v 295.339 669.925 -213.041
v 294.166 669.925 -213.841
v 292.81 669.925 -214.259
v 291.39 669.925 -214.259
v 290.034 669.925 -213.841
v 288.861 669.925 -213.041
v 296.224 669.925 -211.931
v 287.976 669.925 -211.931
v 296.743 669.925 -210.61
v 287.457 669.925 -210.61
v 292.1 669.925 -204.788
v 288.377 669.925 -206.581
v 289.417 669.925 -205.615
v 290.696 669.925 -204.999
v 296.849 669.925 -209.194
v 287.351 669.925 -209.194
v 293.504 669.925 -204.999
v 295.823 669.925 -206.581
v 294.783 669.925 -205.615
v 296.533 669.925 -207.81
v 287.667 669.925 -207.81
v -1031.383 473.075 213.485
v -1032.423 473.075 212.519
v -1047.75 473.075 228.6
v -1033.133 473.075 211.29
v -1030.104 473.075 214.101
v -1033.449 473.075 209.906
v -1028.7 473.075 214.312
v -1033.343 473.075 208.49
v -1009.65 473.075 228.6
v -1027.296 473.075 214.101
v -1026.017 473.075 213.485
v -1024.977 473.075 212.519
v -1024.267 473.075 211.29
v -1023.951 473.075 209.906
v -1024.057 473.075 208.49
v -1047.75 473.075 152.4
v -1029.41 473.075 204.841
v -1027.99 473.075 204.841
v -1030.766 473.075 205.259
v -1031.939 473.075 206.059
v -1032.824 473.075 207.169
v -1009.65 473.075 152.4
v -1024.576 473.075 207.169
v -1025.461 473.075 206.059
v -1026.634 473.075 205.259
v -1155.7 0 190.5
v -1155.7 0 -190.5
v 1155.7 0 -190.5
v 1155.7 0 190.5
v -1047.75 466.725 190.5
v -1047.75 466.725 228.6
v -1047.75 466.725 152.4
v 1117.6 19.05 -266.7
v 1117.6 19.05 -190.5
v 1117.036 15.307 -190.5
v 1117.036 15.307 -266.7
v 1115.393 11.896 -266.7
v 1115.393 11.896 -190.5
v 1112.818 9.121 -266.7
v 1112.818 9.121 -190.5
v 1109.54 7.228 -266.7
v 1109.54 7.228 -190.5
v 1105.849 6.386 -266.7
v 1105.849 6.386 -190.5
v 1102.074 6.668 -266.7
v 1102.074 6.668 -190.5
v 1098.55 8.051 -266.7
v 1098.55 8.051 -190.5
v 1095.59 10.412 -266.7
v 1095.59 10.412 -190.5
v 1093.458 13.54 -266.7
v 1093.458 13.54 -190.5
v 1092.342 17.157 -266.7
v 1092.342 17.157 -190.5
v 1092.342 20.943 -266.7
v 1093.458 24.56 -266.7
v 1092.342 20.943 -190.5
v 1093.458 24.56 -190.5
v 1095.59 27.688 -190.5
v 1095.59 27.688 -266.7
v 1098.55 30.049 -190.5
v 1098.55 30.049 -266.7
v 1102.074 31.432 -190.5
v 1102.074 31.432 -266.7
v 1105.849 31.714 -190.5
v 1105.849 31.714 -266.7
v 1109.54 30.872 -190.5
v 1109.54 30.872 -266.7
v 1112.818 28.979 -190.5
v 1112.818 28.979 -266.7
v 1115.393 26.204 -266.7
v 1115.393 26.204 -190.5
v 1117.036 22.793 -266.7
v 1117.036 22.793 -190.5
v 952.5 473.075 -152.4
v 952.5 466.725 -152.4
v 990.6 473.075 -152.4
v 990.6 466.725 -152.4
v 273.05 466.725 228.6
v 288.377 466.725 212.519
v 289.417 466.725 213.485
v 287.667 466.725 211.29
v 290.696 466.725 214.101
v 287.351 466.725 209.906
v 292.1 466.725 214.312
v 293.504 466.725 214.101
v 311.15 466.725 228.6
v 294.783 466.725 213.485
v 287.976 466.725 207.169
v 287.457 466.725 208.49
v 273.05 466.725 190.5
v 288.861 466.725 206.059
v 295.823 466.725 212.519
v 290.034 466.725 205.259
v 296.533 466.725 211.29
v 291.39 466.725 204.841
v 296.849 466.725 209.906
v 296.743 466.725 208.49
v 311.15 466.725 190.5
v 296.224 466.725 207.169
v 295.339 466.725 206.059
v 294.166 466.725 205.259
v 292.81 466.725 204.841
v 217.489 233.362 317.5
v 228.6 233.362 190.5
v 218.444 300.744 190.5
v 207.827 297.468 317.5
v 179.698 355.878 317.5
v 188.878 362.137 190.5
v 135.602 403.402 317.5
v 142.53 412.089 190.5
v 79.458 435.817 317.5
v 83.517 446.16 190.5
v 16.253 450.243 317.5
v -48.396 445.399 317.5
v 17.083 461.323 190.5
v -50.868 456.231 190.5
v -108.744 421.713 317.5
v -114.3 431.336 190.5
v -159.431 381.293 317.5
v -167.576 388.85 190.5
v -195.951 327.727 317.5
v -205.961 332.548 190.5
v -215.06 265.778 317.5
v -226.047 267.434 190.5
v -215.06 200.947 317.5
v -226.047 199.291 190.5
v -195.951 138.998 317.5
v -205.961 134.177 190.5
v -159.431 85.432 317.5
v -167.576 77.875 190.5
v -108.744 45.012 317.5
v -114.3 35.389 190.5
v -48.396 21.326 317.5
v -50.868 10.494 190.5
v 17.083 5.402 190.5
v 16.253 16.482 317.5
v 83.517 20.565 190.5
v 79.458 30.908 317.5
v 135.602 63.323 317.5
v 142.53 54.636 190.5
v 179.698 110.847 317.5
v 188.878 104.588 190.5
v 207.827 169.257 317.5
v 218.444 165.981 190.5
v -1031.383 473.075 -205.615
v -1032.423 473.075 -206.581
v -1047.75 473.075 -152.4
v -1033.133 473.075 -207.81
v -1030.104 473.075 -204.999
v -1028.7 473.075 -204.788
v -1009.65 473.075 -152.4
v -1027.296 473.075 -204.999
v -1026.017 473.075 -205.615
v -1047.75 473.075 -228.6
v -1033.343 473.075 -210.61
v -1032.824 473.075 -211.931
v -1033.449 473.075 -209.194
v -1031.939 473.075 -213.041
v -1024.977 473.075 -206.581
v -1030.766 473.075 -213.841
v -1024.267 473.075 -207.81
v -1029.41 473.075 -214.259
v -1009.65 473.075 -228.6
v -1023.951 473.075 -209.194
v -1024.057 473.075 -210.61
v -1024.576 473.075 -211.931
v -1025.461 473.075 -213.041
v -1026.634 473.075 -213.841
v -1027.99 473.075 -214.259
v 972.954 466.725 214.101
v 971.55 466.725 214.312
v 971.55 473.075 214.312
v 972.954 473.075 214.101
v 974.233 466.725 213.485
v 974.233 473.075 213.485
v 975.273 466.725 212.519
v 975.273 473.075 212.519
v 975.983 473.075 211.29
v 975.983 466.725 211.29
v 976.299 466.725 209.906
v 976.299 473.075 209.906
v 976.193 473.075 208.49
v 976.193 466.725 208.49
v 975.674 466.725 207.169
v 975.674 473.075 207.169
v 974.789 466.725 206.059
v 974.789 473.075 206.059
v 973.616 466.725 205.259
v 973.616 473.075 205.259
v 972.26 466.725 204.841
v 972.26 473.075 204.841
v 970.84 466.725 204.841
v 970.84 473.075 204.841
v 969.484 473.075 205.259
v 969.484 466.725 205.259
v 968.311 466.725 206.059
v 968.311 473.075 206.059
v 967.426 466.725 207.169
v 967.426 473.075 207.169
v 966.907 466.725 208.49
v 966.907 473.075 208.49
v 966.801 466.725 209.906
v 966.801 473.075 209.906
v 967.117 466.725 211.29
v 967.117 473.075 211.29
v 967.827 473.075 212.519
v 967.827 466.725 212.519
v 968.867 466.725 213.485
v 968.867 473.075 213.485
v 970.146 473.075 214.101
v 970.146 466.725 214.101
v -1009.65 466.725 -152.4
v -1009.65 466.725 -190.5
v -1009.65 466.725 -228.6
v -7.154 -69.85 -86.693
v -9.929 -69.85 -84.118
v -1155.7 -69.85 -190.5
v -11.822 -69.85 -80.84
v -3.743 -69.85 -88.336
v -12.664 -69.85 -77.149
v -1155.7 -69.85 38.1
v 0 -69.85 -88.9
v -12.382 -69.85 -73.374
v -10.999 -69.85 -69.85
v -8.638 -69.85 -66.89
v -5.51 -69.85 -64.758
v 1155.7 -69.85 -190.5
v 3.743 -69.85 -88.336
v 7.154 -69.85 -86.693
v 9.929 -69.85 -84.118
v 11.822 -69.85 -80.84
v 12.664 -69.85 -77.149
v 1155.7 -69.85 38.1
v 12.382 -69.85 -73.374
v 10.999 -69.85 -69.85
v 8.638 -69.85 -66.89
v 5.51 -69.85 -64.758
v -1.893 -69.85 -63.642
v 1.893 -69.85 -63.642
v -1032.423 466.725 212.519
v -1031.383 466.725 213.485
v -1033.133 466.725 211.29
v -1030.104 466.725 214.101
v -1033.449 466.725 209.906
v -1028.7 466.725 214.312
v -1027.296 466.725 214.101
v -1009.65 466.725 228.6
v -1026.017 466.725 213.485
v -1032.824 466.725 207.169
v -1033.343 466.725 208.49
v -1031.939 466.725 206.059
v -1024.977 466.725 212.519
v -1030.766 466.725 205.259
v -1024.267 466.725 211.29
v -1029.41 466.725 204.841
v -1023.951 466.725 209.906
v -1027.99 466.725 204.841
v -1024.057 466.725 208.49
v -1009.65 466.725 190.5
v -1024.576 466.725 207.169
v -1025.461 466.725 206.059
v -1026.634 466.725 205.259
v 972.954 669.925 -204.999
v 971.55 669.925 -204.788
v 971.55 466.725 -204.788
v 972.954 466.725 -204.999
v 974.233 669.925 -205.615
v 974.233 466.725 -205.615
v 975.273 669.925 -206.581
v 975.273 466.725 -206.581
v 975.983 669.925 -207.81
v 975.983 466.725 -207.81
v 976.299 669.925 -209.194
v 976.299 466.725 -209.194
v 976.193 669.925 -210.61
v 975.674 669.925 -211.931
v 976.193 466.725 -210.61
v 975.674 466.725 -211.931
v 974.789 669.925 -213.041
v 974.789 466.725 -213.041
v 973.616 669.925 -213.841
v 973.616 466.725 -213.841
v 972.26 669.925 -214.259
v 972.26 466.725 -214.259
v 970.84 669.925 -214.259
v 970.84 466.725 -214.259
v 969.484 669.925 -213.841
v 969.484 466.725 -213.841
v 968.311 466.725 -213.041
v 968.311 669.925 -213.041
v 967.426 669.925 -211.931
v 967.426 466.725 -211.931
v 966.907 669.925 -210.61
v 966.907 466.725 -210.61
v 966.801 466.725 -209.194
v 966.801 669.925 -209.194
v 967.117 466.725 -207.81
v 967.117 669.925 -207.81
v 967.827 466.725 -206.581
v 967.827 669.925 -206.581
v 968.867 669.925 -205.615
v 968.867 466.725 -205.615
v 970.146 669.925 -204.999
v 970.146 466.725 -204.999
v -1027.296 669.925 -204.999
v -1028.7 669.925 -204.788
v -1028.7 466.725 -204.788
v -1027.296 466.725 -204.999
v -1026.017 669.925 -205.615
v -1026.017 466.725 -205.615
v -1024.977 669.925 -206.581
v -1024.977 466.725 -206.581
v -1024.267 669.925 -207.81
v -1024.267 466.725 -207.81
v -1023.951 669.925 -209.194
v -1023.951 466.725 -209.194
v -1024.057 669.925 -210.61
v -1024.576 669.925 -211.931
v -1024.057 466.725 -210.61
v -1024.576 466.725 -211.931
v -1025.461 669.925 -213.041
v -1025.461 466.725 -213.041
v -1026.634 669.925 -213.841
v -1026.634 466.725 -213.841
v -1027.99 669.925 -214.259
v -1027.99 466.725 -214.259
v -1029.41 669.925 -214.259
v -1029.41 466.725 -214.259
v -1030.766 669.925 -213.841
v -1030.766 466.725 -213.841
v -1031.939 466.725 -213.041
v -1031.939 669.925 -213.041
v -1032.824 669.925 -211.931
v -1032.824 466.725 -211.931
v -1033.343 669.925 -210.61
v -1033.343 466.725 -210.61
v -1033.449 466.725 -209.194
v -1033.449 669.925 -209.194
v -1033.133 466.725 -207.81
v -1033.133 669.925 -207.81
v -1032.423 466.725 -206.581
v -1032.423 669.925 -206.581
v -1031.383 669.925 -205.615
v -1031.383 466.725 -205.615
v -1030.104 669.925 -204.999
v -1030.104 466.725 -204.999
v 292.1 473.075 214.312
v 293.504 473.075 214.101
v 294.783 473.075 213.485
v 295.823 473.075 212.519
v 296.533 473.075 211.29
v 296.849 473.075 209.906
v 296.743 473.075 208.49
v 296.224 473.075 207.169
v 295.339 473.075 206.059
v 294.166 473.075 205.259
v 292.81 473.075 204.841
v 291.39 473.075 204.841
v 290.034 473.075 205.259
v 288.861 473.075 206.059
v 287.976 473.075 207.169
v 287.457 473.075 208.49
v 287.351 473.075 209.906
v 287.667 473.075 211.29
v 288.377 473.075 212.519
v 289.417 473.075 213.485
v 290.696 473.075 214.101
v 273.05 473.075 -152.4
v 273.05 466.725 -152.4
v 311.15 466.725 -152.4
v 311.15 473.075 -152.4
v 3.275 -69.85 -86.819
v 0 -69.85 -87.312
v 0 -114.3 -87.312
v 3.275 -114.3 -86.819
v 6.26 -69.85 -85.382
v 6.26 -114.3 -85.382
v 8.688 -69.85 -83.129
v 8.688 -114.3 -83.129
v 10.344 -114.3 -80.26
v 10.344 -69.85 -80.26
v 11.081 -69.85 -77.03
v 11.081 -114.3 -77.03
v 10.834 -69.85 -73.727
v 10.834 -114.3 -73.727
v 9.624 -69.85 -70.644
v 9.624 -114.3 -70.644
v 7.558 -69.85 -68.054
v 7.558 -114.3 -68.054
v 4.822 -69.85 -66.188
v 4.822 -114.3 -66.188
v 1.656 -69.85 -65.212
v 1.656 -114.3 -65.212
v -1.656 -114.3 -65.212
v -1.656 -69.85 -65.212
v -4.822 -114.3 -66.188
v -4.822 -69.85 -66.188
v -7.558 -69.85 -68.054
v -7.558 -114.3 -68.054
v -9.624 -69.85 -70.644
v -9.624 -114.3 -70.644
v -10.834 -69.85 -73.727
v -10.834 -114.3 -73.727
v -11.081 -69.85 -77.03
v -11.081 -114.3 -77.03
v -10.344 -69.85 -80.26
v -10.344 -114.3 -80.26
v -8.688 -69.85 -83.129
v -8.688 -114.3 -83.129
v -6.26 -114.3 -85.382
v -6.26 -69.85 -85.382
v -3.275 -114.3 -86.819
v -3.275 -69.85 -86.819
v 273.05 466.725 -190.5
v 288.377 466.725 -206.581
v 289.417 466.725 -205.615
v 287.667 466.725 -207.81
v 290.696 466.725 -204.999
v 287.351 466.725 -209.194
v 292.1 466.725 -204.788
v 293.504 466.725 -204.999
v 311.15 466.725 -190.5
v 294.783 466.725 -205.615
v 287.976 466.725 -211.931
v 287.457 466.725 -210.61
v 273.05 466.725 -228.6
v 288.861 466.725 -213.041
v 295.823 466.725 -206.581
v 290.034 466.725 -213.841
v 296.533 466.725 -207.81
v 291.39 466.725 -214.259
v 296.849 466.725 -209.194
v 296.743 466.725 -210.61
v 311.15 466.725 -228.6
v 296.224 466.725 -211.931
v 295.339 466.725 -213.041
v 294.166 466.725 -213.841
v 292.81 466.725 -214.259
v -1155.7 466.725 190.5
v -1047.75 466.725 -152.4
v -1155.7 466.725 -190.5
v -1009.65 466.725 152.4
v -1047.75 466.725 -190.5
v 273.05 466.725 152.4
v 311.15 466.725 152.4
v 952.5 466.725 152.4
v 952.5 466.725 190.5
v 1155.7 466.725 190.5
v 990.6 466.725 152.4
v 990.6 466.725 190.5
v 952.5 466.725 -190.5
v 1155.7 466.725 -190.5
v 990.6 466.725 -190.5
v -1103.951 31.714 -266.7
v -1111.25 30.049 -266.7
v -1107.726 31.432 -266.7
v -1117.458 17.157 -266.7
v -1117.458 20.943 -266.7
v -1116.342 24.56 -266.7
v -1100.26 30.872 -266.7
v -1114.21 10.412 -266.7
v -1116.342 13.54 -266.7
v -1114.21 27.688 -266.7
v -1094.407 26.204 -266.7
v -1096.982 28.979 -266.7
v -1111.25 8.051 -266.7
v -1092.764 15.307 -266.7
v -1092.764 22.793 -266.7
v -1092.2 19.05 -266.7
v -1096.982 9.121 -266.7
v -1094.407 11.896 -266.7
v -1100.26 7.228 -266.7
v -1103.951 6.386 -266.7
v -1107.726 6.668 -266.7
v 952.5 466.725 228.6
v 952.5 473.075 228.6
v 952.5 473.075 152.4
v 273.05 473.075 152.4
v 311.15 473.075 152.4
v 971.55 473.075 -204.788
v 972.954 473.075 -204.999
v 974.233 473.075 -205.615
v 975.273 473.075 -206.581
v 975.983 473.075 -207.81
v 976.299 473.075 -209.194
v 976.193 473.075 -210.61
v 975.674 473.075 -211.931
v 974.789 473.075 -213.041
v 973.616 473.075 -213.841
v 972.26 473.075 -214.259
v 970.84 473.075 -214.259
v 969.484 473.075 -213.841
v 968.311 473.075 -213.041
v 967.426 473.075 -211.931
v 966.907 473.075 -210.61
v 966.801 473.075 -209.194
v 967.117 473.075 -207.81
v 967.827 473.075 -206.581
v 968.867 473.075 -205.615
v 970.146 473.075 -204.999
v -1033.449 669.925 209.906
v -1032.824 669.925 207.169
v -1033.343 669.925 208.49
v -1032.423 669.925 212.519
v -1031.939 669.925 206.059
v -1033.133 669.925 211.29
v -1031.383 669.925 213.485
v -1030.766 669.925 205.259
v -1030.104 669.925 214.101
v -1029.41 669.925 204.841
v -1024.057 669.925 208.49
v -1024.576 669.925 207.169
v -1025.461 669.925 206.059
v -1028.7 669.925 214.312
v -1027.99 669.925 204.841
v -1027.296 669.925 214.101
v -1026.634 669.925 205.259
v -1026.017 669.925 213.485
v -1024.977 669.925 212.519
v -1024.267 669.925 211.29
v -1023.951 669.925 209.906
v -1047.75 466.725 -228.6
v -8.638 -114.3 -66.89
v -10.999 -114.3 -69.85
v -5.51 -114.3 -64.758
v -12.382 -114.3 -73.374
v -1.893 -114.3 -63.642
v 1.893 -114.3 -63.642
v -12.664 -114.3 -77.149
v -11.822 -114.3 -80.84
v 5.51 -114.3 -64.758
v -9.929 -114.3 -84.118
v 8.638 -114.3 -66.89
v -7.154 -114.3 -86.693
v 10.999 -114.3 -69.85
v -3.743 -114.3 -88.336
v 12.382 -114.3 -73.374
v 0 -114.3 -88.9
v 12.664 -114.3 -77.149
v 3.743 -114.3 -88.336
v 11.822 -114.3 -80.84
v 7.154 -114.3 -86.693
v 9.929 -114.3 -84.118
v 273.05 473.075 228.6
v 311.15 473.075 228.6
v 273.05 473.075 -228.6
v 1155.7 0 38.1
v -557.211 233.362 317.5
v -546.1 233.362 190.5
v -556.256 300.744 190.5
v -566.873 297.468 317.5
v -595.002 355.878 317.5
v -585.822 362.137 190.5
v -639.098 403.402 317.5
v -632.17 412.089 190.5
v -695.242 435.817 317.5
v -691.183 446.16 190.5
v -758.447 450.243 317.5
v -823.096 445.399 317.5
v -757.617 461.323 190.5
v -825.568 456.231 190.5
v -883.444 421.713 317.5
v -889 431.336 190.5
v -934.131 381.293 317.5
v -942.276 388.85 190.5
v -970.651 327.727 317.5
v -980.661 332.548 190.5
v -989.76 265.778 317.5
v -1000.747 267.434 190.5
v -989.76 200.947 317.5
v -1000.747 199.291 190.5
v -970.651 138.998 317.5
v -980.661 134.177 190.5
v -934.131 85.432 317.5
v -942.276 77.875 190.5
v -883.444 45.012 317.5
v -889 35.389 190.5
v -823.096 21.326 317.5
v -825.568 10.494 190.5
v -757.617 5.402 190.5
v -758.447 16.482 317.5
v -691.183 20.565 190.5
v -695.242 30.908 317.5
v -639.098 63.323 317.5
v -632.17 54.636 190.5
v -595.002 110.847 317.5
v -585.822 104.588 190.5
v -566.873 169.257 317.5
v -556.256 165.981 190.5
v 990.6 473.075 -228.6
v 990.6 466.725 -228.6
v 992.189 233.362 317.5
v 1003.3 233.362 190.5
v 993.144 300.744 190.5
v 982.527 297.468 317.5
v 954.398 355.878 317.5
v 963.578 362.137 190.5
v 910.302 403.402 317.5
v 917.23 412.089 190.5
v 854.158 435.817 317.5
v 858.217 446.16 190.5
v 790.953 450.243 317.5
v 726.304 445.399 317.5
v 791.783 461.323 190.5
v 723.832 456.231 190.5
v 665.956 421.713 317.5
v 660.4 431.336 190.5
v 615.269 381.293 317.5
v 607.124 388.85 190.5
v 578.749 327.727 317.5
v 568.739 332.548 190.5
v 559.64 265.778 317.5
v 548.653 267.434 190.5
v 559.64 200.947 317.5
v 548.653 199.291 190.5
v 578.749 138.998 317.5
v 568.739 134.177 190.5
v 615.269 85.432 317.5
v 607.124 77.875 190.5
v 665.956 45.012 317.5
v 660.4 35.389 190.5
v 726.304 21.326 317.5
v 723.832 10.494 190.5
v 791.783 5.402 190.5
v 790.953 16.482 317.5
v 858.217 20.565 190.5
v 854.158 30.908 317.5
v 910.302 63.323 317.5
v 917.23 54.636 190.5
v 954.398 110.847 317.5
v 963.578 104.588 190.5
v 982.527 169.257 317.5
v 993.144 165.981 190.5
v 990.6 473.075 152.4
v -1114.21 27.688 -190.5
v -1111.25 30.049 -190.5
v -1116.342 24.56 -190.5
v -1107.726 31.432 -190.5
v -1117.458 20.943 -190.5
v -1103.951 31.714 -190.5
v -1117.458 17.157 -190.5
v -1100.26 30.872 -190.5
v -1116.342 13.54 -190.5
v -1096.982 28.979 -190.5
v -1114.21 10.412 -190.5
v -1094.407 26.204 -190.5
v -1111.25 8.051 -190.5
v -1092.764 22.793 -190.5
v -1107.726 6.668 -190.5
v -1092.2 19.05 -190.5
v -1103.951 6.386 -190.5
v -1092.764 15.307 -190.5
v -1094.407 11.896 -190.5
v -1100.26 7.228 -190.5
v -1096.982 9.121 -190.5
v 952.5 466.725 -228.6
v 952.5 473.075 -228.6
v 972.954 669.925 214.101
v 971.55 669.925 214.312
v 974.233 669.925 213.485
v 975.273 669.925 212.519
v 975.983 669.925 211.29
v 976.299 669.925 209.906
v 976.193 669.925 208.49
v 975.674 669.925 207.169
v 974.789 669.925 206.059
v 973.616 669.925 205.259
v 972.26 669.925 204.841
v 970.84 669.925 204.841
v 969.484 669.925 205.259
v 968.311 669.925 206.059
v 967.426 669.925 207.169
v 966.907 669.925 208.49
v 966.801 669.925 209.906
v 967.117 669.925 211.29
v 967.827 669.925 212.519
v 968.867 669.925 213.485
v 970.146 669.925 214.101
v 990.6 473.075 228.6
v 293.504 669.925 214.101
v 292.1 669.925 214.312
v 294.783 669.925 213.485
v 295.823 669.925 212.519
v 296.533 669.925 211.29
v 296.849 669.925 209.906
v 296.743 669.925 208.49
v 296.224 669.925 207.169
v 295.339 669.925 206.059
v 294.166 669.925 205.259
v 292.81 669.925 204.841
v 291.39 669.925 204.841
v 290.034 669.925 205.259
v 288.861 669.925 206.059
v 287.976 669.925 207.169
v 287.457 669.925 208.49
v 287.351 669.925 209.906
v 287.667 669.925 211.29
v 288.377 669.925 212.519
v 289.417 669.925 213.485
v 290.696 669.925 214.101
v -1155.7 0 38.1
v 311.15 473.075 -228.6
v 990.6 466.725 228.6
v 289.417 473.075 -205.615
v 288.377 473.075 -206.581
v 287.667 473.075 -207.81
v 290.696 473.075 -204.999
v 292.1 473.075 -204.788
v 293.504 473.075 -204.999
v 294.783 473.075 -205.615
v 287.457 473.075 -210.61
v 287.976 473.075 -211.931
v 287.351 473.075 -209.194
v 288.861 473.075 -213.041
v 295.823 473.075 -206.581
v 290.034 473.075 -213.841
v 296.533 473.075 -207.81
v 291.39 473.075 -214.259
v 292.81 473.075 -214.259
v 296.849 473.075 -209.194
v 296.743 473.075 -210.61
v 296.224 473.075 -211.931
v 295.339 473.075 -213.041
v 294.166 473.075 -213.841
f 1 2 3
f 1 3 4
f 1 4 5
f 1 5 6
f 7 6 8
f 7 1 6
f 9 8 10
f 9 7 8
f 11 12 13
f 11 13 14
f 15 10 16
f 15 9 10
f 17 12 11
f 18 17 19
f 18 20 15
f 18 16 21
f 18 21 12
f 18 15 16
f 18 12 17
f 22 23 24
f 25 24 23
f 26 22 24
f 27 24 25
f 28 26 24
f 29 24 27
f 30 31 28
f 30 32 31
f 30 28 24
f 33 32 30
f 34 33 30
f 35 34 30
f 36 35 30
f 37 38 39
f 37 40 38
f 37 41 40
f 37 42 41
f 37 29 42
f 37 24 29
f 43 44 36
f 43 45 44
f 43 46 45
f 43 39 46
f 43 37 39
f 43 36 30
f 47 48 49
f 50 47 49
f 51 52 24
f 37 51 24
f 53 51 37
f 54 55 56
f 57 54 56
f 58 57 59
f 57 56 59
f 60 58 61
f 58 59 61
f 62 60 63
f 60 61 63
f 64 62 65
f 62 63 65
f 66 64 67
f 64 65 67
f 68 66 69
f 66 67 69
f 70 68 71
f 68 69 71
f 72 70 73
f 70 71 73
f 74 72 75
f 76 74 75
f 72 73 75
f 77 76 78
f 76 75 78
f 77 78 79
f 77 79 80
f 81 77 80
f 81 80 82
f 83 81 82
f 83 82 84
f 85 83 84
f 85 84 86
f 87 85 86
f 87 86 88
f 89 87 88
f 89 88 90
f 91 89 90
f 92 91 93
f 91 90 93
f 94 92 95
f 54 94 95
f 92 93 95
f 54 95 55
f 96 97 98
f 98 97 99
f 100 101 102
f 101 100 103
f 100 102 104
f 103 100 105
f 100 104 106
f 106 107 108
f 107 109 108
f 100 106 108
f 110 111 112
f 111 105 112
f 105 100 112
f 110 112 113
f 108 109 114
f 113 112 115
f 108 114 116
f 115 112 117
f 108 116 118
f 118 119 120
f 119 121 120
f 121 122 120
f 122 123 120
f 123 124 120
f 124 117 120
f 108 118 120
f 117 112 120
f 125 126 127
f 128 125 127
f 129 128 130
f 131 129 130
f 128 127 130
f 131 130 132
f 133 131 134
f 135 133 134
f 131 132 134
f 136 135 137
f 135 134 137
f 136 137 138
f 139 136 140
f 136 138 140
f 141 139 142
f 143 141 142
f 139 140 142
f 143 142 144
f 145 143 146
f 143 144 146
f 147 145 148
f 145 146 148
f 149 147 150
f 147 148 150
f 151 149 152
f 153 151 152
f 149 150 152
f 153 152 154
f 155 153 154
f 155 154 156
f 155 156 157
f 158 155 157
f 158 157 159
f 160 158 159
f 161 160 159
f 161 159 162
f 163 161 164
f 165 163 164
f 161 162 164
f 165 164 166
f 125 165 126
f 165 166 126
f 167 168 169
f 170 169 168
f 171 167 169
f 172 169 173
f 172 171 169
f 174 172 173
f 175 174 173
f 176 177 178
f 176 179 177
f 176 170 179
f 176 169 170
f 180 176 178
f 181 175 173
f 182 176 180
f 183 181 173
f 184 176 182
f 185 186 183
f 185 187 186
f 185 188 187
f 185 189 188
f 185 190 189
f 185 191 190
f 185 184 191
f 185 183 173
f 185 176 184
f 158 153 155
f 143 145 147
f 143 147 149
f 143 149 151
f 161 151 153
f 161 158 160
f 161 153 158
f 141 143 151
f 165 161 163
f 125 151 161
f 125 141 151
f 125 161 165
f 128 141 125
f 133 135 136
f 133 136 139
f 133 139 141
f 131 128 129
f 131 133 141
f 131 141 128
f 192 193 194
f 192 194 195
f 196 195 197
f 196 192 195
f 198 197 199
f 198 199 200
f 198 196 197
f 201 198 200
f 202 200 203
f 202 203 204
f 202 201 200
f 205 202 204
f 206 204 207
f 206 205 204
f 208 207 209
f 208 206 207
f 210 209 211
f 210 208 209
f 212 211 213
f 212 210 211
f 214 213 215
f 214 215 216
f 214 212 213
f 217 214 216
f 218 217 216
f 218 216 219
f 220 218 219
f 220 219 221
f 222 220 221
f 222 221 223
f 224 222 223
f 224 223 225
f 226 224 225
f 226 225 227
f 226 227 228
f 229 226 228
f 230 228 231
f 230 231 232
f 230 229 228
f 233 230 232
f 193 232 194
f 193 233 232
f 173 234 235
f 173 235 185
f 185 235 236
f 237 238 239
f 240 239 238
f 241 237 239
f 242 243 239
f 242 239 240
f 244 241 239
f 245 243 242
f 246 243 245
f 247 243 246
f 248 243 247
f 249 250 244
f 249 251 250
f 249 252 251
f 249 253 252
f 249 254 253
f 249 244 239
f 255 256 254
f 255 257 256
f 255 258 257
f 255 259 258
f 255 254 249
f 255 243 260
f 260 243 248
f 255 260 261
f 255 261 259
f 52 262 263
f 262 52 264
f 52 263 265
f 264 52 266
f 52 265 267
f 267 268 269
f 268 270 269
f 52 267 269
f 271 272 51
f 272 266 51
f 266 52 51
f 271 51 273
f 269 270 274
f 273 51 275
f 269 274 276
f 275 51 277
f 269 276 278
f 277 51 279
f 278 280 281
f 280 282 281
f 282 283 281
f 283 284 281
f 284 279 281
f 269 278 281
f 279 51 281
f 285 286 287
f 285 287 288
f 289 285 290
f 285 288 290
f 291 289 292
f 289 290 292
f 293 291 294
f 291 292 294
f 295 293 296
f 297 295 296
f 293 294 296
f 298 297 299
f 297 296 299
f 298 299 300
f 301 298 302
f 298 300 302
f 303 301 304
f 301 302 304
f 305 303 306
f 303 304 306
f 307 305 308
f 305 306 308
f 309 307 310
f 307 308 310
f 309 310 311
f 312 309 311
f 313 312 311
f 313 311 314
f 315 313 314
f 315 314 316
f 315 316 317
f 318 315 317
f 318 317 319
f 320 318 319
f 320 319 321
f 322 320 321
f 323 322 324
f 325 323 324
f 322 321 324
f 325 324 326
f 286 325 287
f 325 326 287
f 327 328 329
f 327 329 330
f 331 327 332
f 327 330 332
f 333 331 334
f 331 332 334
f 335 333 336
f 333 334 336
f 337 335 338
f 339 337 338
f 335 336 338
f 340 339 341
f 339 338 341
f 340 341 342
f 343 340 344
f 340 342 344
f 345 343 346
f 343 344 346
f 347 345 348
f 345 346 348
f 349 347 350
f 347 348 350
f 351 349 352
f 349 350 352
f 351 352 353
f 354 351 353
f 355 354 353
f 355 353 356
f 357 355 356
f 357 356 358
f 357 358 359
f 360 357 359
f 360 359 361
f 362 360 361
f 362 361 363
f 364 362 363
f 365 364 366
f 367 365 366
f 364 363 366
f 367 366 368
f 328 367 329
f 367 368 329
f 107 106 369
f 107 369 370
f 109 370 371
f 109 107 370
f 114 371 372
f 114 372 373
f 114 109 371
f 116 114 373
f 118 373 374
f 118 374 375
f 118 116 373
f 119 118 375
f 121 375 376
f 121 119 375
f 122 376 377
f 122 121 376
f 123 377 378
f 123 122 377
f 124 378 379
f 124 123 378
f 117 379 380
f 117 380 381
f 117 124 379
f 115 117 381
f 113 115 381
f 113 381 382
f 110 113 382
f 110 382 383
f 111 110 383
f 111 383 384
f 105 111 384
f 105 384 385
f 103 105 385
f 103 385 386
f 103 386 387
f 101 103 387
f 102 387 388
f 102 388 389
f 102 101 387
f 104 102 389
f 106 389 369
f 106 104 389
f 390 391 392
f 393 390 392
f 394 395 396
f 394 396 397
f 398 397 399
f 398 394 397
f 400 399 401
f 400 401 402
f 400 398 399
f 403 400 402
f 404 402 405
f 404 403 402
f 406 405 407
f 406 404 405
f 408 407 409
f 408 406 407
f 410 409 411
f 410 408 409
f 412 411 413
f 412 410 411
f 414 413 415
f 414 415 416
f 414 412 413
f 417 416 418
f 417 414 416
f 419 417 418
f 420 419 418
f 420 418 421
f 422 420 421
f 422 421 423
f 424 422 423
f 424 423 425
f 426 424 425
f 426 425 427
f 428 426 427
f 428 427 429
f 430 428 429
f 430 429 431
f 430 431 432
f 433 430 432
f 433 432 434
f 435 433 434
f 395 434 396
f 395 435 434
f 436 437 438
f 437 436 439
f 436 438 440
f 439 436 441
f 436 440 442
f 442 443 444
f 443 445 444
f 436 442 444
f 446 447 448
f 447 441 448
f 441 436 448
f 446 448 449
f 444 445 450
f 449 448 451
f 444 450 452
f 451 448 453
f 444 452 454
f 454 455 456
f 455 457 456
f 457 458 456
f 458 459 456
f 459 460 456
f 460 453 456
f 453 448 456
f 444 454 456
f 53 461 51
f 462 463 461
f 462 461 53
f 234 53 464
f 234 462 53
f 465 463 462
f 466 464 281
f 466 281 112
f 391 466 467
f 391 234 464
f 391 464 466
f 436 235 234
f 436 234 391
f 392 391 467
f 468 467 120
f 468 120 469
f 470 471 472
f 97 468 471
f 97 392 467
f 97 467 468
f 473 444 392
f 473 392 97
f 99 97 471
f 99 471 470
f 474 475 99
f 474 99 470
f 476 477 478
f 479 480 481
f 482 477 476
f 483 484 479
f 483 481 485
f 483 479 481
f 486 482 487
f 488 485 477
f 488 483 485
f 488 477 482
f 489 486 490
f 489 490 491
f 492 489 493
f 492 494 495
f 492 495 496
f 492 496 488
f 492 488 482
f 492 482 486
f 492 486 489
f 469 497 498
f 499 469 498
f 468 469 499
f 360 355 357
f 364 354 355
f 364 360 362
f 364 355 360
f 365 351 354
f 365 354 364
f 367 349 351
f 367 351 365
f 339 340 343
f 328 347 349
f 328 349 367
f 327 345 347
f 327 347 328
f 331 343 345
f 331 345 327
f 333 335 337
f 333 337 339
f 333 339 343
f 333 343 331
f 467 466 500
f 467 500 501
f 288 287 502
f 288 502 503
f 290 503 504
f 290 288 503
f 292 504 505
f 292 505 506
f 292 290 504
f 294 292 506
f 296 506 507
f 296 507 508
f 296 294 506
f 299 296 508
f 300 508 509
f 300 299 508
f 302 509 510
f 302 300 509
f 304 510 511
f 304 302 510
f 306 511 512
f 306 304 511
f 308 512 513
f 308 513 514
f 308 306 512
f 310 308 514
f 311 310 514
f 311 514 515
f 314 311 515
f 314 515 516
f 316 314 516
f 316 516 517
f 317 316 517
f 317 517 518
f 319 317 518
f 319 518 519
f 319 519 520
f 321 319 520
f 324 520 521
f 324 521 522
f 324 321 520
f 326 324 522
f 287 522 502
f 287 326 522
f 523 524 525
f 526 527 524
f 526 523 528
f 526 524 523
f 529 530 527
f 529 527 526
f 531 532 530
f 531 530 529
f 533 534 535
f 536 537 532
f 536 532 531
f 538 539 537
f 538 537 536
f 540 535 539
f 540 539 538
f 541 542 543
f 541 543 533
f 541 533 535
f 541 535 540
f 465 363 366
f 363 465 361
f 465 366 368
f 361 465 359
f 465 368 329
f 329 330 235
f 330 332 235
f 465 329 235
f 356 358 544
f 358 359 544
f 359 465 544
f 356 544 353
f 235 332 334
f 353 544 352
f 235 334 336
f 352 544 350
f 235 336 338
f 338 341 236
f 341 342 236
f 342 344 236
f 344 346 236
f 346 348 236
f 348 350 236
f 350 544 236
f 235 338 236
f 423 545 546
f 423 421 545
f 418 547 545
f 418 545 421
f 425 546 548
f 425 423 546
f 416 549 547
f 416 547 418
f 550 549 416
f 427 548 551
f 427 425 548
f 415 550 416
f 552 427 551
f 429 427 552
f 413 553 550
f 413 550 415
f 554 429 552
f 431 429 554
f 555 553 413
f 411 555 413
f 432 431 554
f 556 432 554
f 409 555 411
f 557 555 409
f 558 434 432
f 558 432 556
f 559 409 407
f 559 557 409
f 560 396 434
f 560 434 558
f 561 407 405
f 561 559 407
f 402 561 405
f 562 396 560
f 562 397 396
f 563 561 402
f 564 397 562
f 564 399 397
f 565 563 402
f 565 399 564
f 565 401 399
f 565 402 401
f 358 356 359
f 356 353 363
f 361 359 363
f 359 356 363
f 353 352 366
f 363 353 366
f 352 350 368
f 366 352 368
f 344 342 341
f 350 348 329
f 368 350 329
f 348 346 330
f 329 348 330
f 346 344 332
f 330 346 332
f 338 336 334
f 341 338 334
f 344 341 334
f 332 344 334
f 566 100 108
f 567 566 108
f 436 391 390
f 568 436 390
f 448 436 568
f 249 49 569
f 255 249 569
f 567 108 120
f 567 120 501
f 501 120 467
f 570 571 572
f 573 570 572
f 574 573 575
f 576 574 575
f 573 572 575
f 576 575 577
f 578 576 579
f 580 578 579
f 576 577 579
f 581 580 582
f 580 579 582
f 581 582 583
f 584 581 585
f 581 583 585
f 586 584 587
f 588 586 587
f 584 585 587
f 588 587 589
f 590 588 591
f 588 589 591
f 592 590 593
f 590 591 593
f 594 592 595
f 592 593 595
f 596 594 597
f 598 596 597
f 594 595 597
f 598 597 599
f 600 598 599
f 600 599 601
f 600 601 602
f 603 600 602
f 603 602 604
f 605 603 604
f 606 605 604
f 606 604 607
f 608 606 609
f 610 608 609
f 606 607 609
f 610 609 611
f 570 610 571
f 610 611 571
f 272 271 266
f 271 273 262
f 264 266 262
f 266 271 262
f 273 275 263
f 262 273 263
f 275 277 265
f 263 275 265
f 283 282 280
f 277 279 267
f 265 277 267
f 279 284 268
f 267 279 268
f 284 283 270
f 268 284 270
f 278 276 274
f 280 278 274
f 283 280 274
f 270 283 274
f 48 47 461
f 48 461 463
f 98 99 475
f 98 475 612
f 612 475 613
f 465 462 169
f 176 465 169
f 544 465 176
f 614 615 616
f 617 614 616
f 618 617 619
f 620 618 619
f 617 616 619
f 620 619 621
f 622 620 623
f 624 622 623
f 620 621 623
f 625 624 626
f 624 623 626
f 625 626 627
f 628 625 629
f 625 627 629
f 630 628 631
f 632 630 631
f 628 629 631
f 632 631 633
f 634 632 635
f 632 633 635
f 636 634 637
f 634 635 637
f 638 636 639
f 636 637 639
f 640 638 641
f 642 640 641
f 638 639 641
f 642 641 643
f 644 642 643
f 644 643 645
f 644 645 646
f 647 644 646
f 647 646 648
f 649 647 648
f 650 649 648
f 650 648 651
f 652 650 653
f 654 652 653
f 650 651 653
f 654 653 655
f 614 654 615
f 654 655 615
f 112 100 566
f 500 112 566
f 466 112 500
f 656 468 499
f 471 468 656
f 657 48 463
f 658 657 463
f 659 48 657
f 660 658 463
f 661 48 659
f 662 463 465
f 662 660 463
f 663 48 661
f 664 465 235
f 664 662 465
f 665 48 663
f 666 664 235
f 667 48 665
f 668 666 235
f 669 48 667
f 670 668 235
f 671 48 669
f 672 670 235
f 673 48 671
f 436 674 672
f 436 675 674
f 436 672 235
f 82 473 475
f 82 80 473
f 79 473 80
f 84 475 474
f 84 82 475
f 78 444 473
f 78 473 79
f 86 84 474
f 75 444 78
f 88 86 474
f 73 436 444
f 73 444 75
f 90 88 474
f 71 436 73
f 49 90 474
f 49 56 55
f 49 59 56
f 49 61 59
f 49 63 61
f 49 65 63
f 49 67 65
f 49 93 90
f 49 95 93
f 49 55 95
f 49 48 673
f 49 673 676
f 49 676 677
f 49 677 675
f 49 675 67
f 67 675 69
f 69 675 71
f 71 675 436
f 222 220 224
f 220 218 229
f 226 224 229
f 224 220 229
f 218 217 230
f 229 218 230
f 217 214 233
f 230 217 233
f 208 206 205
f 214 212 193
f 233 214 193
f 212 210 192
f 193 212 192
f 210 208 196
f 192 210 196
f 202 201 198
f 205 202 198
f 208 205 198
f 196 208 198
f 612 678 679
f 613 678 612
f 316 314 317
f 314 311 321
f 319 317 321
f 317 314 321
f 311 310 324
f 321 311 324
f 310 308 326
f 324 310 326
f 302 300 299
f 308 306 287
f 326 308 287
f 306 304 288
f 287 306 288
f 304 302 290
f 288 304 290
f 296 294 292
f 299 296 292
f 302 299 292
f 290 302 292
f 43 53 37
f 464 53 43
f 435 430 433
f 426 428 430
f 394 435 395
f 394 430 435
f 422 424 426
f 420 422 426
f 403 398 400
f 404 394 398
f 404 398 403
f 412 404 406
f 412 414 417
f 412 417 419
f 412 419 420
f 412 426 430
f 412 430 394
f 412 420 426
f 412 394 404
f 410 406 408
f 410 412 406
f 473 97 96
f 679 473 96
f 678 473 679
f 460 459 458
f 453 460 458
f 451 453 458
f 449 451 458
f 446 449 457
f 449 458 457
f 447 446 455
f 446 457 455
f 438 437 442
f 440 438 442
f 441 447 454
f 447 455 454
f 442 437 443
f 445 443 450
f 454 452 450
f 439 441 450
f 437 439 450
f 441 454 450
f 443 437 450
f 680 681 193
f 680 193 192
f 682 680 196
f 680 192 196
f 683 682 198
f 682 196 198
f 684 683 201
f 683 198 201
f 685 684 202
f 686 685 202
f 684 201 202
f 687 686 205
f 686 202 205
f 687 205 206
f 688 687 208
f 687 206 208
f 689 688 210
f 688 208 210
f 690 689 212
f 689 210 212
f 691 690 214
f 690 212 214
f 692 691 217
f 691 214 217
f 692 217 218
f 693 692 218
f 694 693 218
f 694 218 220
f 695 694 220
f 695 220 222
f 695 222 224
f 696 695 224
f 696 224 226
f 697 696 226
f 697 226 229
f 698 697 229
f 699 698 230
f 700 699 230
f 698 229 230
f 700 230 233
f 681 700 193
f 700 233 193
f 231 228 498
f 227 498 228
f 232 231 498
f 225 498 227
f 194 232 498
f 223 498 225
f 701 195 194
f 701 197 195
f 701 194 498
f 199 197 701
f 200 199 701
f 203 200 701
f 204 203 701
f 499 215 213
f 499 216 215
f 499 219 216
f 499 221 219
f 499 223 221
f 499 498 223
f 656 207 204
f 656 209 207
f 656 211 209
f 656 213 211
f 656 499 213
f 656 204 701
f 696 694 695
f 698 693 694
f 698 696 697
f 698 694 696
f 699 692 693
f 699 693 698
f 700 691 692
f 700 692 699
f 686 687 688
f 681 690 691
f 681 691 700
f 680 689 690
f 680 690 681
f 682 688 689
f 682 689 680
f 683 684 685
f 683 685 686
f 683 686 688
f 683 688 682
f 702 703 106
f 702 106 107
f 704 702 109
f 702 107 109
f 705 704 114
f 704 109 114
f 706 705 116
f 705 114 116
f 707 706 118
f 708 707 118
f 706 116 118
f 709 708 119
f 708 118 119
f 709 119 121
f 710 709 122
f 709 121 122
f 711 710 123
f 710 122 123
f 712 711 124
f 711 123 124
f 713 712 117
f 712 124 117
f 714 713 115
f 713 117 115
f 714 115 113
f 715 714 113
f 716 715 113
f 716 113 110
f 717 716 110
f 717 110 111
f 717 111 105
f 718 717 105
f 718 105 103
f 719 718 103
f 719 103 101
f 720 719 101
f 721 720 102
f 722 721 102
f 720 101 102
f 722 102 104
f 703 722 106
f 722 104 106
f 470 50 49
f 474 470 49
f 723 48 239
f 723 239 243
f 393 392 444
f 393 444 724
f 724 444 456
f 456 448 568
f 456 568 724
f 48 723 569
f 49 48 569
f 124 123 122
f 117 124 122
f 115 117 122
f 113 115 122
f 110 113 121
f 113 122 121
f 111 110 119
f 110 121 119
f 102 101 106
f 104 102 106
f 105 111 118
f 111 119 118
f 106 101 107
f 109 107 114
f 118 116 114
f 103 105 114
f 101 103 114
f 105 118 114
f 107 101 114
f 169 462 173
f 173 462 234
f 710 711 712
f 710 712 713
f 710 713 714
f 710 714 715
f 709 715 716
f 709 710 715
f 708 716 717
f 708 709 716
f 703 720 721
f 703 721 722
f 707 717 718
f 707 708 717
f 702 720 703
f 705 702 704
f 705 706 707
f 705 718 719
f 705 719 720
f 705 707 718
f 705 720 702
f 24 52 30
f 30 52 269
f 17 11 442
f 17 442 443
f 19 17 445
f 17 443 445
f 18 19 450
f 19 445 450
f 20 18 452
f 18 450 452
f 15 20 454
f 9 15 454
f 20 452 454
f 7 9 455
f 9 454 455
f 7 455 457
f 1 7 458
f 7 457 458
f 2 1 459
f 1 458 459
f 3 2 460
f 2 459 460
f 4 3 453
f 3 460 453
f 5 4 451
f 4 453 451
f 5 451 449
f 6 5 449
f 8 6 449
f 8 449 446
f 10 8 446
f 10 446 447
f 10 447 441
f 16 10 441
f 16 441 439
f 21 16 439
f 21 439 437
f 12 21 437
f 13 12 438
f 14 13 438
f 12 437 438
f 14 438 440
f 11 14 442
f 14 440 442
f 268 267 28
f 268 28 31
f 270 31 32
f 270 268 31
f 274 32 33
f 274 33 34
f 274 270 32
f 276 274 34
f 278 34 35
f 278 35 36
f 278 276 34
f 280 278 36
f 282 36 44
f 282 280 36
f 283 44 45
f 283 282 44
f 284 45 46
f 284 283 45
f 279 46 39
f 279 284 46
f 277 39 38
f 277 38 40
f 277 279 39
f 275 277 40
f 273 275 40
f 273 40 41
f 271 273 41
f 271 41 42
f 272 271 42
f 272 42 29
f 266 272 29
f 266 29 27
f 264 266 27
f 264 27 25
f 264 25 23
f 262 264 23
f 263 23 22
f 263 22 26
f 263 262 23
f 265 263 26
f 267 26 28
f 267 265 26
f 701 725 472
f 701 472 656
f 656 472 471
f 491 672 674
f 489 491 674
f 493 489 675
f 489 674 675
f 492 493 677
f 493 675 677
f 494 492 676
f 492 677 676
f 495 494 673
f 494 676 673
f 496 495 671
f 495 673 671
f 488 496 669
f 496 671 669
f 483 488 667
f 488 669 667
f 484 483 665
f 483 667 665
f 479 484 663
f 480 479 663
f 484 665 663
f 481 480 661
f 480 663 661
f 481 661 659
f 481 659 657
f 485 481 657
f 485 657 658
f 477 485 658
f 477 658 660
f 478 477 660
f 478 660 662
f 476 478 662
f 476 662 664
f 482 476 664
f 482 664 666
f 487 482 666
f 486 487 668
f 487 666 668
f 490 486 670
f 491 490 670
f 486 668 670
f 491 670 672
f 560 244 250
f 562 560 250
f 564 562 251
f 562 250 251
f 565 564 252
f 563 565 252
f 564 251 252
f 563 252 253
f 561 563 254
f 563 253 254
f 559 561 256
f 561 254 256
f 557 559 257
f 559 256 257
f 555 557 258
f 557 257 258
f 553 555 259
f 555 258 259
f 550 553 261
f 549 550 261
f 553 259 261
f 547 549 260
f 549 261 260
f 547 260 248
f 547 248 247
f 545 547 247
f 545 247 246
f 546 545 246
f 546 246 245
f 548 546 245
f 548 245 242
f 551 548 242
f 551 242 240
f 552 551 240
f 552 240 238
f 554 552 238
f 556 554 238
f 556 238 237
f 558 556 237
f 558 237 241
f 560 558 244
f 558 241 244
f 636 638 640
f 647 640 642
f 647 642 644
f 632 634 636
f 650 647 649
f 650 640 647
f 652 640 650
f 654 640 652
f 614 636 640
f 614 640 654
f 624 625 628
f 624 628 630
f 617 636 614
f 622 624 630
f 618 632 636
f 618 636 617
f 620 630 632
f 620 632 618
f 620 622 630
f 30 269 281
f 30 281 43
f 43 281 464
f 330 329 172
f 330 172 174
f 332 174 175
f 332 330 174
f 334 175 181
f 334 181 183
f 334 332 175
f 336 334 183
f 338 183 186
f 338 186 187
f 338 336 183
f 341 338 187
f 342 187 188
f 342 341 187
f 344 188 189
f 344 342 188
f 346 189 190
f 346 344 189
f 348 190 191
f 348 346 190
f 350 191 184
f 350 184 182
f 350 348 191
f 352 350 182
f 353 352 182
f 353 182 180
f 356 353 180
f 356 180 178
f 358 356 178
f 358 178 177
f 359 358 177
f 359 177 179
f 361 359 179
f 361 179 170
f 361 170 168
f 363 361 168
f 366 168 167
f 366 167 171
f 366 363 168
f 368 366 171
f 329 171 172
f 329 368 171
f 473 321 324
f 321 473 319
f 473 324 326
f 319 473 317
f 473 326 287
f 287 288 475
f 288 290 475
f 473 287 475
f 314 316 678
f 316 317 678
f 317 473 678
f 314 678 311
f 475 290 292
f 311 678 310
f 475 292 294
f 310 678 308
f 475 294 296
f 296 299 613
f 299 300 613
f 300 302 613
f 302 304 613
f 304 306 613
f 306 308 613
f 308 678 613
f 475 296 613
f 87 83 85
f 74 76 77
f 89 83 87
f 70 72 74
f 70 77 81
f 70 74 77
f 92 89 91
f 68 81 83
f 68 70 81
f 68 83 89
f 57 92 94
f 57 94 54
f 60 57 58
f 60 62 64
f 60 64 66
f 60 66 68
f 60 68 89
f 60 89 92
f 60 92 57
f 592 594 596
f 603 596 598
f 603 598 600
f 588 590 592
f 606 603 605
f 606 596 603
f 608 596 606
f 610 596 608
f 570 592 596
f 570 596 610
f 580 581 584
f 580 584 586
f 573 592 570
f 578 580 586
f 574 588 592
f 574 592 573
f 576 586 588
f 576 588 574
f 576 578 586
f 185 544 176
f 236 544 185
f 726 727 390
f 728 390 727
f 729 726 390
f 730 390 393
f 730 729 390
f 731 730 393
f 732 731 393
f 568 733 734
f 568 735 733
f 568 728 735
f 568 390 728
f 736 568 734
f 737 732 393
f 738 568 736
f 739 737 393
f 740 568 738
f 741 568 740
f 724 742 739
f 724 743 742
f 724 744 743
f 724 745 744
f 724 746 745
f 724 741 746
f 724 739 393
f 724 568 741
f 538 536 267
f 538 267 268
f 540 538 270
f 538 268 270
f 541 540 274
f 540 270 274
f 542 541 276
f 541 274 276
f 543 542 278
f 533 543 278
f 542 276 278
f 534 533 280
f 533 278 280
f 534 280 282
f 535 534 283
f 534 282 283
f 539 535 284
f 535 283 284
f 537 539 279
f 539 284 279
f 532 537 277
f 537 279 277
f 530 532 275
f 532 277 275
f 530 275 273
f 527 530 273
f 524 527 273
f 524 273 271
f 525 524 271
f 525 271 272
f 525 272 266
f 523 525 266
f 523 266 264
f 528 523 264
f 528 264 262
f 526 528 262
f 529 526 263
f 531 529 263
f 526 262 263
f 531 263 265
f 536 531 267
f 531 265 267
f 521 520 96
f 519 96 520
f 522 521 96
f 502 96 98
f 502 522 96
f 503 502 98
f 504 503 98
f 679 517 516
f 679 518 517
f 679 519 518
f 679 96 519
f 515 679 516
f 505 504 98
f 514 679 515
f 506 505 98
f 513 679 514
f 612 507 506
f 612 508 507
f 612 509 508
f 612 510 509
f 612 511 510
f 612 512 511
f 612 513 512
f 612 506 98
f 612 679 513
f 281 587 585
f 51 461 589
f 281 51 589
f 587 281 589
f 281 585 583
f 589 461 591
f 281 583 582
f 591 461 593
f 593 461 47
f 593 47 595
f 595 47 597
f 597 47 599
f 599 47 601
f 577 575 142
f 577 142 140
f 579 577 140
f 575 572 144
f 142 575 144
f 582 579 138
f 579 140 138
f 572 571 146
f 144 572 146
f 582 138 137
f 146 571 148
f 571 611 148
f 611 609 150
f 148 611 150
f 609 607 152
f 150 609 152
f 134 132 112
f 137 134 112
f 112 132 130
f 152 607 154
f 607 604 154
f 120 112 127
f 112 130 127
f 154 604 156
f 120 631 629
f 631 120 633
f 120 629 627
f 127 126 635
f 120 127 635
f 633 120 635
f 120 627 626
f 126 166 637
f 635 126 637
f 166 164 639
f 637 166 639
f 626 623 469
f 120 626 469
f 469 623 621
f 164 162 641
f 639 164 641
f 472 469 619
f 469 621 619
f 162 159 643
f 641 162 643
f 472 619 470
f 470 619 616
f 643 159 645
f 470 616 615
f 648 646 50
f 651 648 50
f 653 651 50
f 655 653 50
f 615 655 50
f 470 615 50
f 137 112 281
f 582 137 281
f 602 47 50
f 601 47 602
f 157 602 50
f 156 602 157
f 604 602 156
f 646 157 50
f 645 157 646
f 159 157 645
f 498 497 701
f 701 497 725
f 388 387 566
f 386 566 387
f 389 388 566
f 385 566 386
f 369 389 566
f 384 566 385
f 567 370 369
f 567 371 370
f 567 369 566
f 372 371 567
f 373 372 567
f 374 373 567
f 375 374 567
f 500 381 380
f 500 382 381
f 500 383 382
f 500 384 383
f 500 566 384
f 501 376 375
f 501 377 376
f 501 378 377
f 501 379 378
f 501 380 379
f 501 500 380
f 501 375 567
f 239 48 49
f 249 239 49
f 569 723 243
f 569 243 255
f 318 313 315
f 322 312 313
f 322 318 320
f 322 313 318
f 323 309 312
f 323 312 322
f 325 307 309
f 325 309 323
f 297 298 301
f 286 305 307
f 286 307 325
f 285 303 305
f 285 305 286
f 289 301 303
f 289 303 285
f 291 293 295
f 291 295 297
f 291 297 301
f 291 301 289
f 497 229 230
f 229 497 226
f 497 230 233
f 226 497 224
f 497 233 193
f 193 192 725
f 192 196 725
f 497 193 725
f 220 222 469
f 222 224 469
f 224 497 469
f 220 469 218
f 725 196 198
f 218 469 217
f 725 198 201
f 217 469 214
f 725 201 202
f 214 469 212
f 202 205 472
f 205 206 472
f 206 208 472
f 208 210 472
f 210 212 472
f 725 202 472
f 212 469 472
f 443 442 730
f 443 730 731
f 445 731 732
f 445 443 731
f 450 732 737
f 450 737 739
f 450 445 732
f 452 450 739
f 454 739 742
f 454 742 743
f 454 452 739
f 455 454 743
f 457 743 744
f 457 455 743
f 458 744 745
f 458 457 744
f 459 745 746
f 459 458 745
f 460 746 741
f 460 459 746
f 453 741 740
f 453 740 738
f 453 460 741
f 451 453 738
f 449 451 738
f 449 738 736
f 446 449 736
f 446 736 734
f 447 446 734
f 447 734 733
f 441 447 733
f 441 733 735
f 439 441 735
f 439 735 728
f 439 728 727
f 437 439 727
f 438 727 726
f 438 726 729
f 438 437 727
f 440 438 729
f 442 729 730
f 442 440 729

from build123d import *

# Parameters (mm, degrees)
SKETCH1_W                     = 2311.4
SKETCH1_H                     = 381
BOSS_EXTRUDE1_DEPTH           = 466.725
SKETCH2_R                     = 228.6
BOSS_EXTRUDE2_DEPTH           = 127
BOSS_EXTRUDE2_DRAFT           = 5
BOSS_EXTRUDE2_PROFILE_2_DEPTH = 127
BOSS_EXTRUDE2_PROFILE_2_DRAFT = 5
BOSS_EXTRUDE2_PROFILE_3_DEPTH = 127
BOSS_EXTRUDE2_PROFILE_3_DRAFT = 5
SKETCH3_W                     = 38.1
SKETCH3_H                     = 76.2
SKETCH3_R                     = 4.7625
BOSS_EXTRUDE3_DEPTH           = 6.35
SKETCH4_R                     = 4.7625
BOSS_EXTRUDE4_DEPTH           = 203.2
BOSS_EXTRUDE4_2_DEPTH         = 203.2
BOSS_EXTRUDE4_3_DEPTH         = 203.2
BOSS_EXTRUDE4_4_DEPTH         = 203.2
BOSS_EXTRUDE4_5_DEPTH         = 203.2
BOSS_EXTRUDE4_6_DEPTH         = 203.2
SKETCH5_W                     = 2311.4
SKETCH5_H                     = 228.6
BOSS_EXTRUDE5_DEPTH           = 69.85
SKETCH6_R                     = 12.7
SKETCH6_R_2                   = 11.1125
BOSS_EXTRUDE6_DEPTH           = 44.45
SKETCH7_R                     = 12.7
BOSS_EXTRUDE7_DEPTH           = 76.2


with BuildPart() as part:
    # Sketch1 → Boss-Extrude1 (new body)
    with BuildSketch(Plane(origin=(0, 0, 0), x_dir=(1, 0, 0), z_dir=(0, 1, 0))):
        Rectangle(SKETCH1_W, SKETCH1_H)
    extrude(amount=BOSS_EXTRUDE1_DEPTH)


with BuildPart() as boss_extrude2_tool:
    # Sketch2 → Boss-Extrude2 (with draft: the straight prism first)
    with BuildSketch(Plane.XY.offset(190.5)):
        with Locations((0, 233.3625)):
            Circle(SKETCH2_R)
    extrude(amount=BOSS_EXTRUDE2_DEPTH)
    # Boss-Extrude2: the draft: its side faces are tilted about the plane it starts from
    boss_extrude2_sides = [boss_extrude2_tool.faces().sort_by_distance(p)[0] for p in [
        (-228.6, 233.3625, 254),
    ]]
    draft(boss_extrude2_sides, Plane.XY.offset(190.5), BOSS_EXTRUDE2_DRAFT)


with BuildPart() as part_1:
    add(part.part)

    # Boss-Extrude2: add boss_extrude2_tool
    add(boss_extrude2_tool.part)


with BuildPart() as boss_extrude2_profile_2_tool:
    # Sketch2 → Boss-Extrude2 profile 2 (with draft: the straight prism first)
    with BuildSketch(Plane.XY.offset(190.5)):
        with Locations((774.7, 233.3625)):
            Circle(SKETCH2_R)
    extrude(amount=BOSS_EXTRUDE2_PROFILE_2_DEPTH)
    # Boss-Extrude2 profile 2: the draft: its side faces are tilted about the plane it starts from
    boss_extrude2_profile_2_sides = [boss_extrude2_profile_2_tool.faces().sort_by_distance(p)[0] for p in [
        (546.1, 233.3625, 254),
    ]]
    draft(boss_extrude2_profile_2_sides, Plane.XY.offset(190.5), BOSS_EXTRUDE2_PROFILE_2_DRAFT)


with BuildPart() as part_2:
    add(part_1.part)

    # Boss-Extrude2 profile 2: add boss_extrude2_profile_2_tool
    add(boss_extrude2_profile_2_tool.part)


with BuildPart() as boss_extrude2_profile_3_tool:
    # Sketch2 → Boss-Extrude2 profile 3 (with draft: the straight prism first)
    with BuildSketch(Plane.XY.offset(190.5)):
        with Locations((-774.7, 233.3625)):
            Circle(SKETCH2_R)
    extrude(amount=BOSS_EXTRUDE2_PROFILE_3_DEPTH)
    # Boss-Extrude2 profile 3: the draft: its side faces are tilted about the plane it starts from
    boss_extrude2_profile_3_sides = [boss_extrude2_profile_3_tool.faces().sort_by_distance(p)[0] for p in [
        (-1003.3, 233.3625, 254),
    ]]
    draft(boss_extrude2_profile_3_sides, Plane.XY.offset(190.5), BOSS_EXTRUDE2_PROFILE_3_DRAFT)


with BuildPart() as part_3:
    add(part_2.part)

    # Boss-Extrude2 profile 3: add boss_extrude2_profile_3_tool
    add(boss_extrude2_profile_3_tool.part)

    # Sketch3 → Boss-Extrude3 (add)
    # profile 1 of 6: a face of its own
    with BuildSketch(Plane(origin=(0, 466.725, 0), x_dir=(1, 0, 0), z_dir=(0, 1, 0))):
        with Locations((292.1, 190.5)):
            Rectangle(SKETCH3_W, SKETCH3_H)
        with Locations(Location((292.1, 209.55, 0), (0, 0, 270))):
            Circle(SKETCH3_R, mode=Mode.SUBTRACT)
    # profile 2 of 6: a face of its own
    with BuildSketch(Plane(origin=(0, 466.725, 0), x_dir=(1, 0, 0), z_dir=(0, 1, 0))):
        with Locations((292.1, -190.5)):
            Rectangle(SKETCH3_W, SKETCH3_H)
        with Locations(Location((292.1, -209.55, 0), (0, 0, 270))):
            Circle(SKETCH3_R, mode=Mode.SUBTRACT)
    # profile 3 of 6: a face of its own
    with BuildSketch(Plane(origin=(0, 466.725, 0), x_dir=(1, 0, 0), z_dir=(0, 1, 0))):
        with Locations((971.55, 190.5)):
            Rectangle(SKETCH3_W, SKETCH3_H)
        with Locations(Location((971.55, 209.55, 0), (0, 0, 270))):
            Circle(SKETCH3_R, mode=Mode.SUBTRACT)
    # profile 4 of 6: a face of its own
    with BuildSketch(Plane(origin=(0, 466.725, 0), x_dir=(1, 0, 0), z_dir=(0, 1, 0))):
        with Locations((971.55, -190.5)):
            Rectangle(SKETCH3_W, SKETCH3_H)
        with Locations(Location((971.55, -209.55, 0), (0, 0, 270))):
            Circle(SKETCH3_R, mode=Mode.SUBTRACT)
    # profile 5 of 6: a face of its own
    with BuildSketch(Plane(origin=(0, 466.725, 0), x_dir=(1, 0, 0), z_dir=(0, 1, 0))):
        with Locations((-1028.7, 190.5)):
            Rectangle(SKETCH3_W, SKETCH3_H)
        with Locations(Location((-1028.7, 209.55, 0), (0, 0, 270))):
            Circle(SKETCH3_R, mode=Mode.SUBTRACT)
    # profile 6 of 6: a face of its own
    with BuildSketch(Plane(origin=(0, 466.725, 0), x_dir=(1, 0, 0), z_dir=(0, 1, 0))):
        with Locations((-1028.7, -190.5)):
            Rectangle(SKETCH3_W, SKETCH3_H)
        with Locations(Location((-1028.7, -209.55, 0), (0, 0, 270))):
            Circle(SKETCH3_R, mode=Mode.SUBTRACT)
    extrude(amount=BOSS_EXTRUDE3_DEPTH)

    # Sketch7 → Boss-Extrude7 (add)
    with BuildSketch(Plane(origin=(0, 0, -190.5), x_dir=(-1, 0, 0), z_dir=(0, 0, -1))):
        with Locations(Location((-1104.9, 19.05, 0), (0, 0, 180))):
            Circle(SKETCH7_R)
        with Locations(Location((1104.9, 19.05, 0), (0, 0, 180))):
            Circle(SKETCH7_R)
    extrude(amount=BOSS_EXTRUDE7_DEPTH)


with BuildPart() as body_2:
    # Sketch4 → Boss-Extrude4 (new body)
    with BuildSketch(Plane(origin=(0, 466.725, 0), x_dir=(1, 0, 0), z_dir=(0, 1, 0))):
        with Locations(Location((-1028.7, 209.55, 0), (0, 0, 270))):
            Circle(SKETCH4_R)
    extrude(amount=BOSS_EXTRUDE4_DEPTH)


with BuildPart() as body_3:
    # Sketch4 → Boss-Extrude4 2 (new body)
    with BuildSketch(Plane(origin=(0, 466.725, 0), x_dir=(1, 0, 0), z_dir=(0, 1, 0))):
        with Locations(Location((-1028.7, -209.55, 0), (0, 0, 270))):
            Circle(SKETCH4_R)
    extrude(amount=BOSS_EXTRUDE4_2_DEPTH)


with BuildPart() as body_4:
    # Sketch4 → Boss-Extrude4 3 (new body)
    with BuildSketch(Plane(origin=(0, 466.725, 0), x_dir=(1, 0, 0), z_dir=(0, 1, 0))):
        with Locations(Location((292.1, -209.55, 0), (0, 0, 270))):
            Circle(SKETCH4_R)
    extrude(amount=BOSS_EXTRUDE4_3_DEPTH)


with BuildPart() as body_5:
    # Sketch4 → Boss-Extrude4 4 (new body)
    with BuildSketch(Plane(origin=(0, 466.725, 0), x_dir=(1, 0, 0), z_dir=(0, 1, 0))):
        with Locations(Location((292.1, 209.55, 0), (0, 0, 270))):
            Circle(SKETCH4_R)
    extrude(amount=BOSS_EXTRUDE4_4_DEPTH)


with BuildPart() as body_6:
    # Sketch4 → Boss-Extrude4 5 (new body)
    with BuildSketch(Plane(origin=(0, 466.725, 0), x_dir=(1, 0, 0), z_dir=(0, 1, 0))):
        with Locations(Location((971.55, 209.55, 0), (0, 0, 270))):
            Circle(SKETCH4_R)
    extrude(amount=BOSS_EXTRUDE4_5_DEPTH)


with BuildPart() as body_7:
    # Sketch4 → Boss-Extrude4 6 (new body)
    with BuildSketch(Plane(origin=(0, 466.725, 0), x_dir=(1, 0, 0), z_dir=(0, 1, 0))):
        with Locations(Location((971.55, -209.55, 0), (0, 0, 270))):
            Circle(SKETCH4_R)
    extrude(amount=BOSS_EXTRUDE4_6_DEPTH)


with BuildPart() as body_8:
    # Sketch5 → Boss-Extrude5 (new body)
    with BuildSketch(Plane.XZ):
        with Locations((0, -76.2)):
            Rectangle(SKETCH5_W, SKETCH5_H)
    extrude(amount=BOSS_EXTRUDE5_DEPTH)

    # Sketch6 → Boss-Extrude6 (add)
    with BuildSketch(Plane.XZ.offset(69.85)):
        with Locations(Location((0, -76.2, 0), (0, 0, 270))):
            Circle(SKETCH6_R)
        with Locations(Location((0, -76.2, 0), (0, 0, 270))):
            Circle(SKETCH6_R_2, mode=Mode.SUBTRACT)
    extrude(amount=BOSS_EXTRUDE6_DEPTH)


solid = Compound([part_3.part, body_2.part, body_3.part, body_4.part, body_5.part, body_6.part, body_7.part, body_8.part])
